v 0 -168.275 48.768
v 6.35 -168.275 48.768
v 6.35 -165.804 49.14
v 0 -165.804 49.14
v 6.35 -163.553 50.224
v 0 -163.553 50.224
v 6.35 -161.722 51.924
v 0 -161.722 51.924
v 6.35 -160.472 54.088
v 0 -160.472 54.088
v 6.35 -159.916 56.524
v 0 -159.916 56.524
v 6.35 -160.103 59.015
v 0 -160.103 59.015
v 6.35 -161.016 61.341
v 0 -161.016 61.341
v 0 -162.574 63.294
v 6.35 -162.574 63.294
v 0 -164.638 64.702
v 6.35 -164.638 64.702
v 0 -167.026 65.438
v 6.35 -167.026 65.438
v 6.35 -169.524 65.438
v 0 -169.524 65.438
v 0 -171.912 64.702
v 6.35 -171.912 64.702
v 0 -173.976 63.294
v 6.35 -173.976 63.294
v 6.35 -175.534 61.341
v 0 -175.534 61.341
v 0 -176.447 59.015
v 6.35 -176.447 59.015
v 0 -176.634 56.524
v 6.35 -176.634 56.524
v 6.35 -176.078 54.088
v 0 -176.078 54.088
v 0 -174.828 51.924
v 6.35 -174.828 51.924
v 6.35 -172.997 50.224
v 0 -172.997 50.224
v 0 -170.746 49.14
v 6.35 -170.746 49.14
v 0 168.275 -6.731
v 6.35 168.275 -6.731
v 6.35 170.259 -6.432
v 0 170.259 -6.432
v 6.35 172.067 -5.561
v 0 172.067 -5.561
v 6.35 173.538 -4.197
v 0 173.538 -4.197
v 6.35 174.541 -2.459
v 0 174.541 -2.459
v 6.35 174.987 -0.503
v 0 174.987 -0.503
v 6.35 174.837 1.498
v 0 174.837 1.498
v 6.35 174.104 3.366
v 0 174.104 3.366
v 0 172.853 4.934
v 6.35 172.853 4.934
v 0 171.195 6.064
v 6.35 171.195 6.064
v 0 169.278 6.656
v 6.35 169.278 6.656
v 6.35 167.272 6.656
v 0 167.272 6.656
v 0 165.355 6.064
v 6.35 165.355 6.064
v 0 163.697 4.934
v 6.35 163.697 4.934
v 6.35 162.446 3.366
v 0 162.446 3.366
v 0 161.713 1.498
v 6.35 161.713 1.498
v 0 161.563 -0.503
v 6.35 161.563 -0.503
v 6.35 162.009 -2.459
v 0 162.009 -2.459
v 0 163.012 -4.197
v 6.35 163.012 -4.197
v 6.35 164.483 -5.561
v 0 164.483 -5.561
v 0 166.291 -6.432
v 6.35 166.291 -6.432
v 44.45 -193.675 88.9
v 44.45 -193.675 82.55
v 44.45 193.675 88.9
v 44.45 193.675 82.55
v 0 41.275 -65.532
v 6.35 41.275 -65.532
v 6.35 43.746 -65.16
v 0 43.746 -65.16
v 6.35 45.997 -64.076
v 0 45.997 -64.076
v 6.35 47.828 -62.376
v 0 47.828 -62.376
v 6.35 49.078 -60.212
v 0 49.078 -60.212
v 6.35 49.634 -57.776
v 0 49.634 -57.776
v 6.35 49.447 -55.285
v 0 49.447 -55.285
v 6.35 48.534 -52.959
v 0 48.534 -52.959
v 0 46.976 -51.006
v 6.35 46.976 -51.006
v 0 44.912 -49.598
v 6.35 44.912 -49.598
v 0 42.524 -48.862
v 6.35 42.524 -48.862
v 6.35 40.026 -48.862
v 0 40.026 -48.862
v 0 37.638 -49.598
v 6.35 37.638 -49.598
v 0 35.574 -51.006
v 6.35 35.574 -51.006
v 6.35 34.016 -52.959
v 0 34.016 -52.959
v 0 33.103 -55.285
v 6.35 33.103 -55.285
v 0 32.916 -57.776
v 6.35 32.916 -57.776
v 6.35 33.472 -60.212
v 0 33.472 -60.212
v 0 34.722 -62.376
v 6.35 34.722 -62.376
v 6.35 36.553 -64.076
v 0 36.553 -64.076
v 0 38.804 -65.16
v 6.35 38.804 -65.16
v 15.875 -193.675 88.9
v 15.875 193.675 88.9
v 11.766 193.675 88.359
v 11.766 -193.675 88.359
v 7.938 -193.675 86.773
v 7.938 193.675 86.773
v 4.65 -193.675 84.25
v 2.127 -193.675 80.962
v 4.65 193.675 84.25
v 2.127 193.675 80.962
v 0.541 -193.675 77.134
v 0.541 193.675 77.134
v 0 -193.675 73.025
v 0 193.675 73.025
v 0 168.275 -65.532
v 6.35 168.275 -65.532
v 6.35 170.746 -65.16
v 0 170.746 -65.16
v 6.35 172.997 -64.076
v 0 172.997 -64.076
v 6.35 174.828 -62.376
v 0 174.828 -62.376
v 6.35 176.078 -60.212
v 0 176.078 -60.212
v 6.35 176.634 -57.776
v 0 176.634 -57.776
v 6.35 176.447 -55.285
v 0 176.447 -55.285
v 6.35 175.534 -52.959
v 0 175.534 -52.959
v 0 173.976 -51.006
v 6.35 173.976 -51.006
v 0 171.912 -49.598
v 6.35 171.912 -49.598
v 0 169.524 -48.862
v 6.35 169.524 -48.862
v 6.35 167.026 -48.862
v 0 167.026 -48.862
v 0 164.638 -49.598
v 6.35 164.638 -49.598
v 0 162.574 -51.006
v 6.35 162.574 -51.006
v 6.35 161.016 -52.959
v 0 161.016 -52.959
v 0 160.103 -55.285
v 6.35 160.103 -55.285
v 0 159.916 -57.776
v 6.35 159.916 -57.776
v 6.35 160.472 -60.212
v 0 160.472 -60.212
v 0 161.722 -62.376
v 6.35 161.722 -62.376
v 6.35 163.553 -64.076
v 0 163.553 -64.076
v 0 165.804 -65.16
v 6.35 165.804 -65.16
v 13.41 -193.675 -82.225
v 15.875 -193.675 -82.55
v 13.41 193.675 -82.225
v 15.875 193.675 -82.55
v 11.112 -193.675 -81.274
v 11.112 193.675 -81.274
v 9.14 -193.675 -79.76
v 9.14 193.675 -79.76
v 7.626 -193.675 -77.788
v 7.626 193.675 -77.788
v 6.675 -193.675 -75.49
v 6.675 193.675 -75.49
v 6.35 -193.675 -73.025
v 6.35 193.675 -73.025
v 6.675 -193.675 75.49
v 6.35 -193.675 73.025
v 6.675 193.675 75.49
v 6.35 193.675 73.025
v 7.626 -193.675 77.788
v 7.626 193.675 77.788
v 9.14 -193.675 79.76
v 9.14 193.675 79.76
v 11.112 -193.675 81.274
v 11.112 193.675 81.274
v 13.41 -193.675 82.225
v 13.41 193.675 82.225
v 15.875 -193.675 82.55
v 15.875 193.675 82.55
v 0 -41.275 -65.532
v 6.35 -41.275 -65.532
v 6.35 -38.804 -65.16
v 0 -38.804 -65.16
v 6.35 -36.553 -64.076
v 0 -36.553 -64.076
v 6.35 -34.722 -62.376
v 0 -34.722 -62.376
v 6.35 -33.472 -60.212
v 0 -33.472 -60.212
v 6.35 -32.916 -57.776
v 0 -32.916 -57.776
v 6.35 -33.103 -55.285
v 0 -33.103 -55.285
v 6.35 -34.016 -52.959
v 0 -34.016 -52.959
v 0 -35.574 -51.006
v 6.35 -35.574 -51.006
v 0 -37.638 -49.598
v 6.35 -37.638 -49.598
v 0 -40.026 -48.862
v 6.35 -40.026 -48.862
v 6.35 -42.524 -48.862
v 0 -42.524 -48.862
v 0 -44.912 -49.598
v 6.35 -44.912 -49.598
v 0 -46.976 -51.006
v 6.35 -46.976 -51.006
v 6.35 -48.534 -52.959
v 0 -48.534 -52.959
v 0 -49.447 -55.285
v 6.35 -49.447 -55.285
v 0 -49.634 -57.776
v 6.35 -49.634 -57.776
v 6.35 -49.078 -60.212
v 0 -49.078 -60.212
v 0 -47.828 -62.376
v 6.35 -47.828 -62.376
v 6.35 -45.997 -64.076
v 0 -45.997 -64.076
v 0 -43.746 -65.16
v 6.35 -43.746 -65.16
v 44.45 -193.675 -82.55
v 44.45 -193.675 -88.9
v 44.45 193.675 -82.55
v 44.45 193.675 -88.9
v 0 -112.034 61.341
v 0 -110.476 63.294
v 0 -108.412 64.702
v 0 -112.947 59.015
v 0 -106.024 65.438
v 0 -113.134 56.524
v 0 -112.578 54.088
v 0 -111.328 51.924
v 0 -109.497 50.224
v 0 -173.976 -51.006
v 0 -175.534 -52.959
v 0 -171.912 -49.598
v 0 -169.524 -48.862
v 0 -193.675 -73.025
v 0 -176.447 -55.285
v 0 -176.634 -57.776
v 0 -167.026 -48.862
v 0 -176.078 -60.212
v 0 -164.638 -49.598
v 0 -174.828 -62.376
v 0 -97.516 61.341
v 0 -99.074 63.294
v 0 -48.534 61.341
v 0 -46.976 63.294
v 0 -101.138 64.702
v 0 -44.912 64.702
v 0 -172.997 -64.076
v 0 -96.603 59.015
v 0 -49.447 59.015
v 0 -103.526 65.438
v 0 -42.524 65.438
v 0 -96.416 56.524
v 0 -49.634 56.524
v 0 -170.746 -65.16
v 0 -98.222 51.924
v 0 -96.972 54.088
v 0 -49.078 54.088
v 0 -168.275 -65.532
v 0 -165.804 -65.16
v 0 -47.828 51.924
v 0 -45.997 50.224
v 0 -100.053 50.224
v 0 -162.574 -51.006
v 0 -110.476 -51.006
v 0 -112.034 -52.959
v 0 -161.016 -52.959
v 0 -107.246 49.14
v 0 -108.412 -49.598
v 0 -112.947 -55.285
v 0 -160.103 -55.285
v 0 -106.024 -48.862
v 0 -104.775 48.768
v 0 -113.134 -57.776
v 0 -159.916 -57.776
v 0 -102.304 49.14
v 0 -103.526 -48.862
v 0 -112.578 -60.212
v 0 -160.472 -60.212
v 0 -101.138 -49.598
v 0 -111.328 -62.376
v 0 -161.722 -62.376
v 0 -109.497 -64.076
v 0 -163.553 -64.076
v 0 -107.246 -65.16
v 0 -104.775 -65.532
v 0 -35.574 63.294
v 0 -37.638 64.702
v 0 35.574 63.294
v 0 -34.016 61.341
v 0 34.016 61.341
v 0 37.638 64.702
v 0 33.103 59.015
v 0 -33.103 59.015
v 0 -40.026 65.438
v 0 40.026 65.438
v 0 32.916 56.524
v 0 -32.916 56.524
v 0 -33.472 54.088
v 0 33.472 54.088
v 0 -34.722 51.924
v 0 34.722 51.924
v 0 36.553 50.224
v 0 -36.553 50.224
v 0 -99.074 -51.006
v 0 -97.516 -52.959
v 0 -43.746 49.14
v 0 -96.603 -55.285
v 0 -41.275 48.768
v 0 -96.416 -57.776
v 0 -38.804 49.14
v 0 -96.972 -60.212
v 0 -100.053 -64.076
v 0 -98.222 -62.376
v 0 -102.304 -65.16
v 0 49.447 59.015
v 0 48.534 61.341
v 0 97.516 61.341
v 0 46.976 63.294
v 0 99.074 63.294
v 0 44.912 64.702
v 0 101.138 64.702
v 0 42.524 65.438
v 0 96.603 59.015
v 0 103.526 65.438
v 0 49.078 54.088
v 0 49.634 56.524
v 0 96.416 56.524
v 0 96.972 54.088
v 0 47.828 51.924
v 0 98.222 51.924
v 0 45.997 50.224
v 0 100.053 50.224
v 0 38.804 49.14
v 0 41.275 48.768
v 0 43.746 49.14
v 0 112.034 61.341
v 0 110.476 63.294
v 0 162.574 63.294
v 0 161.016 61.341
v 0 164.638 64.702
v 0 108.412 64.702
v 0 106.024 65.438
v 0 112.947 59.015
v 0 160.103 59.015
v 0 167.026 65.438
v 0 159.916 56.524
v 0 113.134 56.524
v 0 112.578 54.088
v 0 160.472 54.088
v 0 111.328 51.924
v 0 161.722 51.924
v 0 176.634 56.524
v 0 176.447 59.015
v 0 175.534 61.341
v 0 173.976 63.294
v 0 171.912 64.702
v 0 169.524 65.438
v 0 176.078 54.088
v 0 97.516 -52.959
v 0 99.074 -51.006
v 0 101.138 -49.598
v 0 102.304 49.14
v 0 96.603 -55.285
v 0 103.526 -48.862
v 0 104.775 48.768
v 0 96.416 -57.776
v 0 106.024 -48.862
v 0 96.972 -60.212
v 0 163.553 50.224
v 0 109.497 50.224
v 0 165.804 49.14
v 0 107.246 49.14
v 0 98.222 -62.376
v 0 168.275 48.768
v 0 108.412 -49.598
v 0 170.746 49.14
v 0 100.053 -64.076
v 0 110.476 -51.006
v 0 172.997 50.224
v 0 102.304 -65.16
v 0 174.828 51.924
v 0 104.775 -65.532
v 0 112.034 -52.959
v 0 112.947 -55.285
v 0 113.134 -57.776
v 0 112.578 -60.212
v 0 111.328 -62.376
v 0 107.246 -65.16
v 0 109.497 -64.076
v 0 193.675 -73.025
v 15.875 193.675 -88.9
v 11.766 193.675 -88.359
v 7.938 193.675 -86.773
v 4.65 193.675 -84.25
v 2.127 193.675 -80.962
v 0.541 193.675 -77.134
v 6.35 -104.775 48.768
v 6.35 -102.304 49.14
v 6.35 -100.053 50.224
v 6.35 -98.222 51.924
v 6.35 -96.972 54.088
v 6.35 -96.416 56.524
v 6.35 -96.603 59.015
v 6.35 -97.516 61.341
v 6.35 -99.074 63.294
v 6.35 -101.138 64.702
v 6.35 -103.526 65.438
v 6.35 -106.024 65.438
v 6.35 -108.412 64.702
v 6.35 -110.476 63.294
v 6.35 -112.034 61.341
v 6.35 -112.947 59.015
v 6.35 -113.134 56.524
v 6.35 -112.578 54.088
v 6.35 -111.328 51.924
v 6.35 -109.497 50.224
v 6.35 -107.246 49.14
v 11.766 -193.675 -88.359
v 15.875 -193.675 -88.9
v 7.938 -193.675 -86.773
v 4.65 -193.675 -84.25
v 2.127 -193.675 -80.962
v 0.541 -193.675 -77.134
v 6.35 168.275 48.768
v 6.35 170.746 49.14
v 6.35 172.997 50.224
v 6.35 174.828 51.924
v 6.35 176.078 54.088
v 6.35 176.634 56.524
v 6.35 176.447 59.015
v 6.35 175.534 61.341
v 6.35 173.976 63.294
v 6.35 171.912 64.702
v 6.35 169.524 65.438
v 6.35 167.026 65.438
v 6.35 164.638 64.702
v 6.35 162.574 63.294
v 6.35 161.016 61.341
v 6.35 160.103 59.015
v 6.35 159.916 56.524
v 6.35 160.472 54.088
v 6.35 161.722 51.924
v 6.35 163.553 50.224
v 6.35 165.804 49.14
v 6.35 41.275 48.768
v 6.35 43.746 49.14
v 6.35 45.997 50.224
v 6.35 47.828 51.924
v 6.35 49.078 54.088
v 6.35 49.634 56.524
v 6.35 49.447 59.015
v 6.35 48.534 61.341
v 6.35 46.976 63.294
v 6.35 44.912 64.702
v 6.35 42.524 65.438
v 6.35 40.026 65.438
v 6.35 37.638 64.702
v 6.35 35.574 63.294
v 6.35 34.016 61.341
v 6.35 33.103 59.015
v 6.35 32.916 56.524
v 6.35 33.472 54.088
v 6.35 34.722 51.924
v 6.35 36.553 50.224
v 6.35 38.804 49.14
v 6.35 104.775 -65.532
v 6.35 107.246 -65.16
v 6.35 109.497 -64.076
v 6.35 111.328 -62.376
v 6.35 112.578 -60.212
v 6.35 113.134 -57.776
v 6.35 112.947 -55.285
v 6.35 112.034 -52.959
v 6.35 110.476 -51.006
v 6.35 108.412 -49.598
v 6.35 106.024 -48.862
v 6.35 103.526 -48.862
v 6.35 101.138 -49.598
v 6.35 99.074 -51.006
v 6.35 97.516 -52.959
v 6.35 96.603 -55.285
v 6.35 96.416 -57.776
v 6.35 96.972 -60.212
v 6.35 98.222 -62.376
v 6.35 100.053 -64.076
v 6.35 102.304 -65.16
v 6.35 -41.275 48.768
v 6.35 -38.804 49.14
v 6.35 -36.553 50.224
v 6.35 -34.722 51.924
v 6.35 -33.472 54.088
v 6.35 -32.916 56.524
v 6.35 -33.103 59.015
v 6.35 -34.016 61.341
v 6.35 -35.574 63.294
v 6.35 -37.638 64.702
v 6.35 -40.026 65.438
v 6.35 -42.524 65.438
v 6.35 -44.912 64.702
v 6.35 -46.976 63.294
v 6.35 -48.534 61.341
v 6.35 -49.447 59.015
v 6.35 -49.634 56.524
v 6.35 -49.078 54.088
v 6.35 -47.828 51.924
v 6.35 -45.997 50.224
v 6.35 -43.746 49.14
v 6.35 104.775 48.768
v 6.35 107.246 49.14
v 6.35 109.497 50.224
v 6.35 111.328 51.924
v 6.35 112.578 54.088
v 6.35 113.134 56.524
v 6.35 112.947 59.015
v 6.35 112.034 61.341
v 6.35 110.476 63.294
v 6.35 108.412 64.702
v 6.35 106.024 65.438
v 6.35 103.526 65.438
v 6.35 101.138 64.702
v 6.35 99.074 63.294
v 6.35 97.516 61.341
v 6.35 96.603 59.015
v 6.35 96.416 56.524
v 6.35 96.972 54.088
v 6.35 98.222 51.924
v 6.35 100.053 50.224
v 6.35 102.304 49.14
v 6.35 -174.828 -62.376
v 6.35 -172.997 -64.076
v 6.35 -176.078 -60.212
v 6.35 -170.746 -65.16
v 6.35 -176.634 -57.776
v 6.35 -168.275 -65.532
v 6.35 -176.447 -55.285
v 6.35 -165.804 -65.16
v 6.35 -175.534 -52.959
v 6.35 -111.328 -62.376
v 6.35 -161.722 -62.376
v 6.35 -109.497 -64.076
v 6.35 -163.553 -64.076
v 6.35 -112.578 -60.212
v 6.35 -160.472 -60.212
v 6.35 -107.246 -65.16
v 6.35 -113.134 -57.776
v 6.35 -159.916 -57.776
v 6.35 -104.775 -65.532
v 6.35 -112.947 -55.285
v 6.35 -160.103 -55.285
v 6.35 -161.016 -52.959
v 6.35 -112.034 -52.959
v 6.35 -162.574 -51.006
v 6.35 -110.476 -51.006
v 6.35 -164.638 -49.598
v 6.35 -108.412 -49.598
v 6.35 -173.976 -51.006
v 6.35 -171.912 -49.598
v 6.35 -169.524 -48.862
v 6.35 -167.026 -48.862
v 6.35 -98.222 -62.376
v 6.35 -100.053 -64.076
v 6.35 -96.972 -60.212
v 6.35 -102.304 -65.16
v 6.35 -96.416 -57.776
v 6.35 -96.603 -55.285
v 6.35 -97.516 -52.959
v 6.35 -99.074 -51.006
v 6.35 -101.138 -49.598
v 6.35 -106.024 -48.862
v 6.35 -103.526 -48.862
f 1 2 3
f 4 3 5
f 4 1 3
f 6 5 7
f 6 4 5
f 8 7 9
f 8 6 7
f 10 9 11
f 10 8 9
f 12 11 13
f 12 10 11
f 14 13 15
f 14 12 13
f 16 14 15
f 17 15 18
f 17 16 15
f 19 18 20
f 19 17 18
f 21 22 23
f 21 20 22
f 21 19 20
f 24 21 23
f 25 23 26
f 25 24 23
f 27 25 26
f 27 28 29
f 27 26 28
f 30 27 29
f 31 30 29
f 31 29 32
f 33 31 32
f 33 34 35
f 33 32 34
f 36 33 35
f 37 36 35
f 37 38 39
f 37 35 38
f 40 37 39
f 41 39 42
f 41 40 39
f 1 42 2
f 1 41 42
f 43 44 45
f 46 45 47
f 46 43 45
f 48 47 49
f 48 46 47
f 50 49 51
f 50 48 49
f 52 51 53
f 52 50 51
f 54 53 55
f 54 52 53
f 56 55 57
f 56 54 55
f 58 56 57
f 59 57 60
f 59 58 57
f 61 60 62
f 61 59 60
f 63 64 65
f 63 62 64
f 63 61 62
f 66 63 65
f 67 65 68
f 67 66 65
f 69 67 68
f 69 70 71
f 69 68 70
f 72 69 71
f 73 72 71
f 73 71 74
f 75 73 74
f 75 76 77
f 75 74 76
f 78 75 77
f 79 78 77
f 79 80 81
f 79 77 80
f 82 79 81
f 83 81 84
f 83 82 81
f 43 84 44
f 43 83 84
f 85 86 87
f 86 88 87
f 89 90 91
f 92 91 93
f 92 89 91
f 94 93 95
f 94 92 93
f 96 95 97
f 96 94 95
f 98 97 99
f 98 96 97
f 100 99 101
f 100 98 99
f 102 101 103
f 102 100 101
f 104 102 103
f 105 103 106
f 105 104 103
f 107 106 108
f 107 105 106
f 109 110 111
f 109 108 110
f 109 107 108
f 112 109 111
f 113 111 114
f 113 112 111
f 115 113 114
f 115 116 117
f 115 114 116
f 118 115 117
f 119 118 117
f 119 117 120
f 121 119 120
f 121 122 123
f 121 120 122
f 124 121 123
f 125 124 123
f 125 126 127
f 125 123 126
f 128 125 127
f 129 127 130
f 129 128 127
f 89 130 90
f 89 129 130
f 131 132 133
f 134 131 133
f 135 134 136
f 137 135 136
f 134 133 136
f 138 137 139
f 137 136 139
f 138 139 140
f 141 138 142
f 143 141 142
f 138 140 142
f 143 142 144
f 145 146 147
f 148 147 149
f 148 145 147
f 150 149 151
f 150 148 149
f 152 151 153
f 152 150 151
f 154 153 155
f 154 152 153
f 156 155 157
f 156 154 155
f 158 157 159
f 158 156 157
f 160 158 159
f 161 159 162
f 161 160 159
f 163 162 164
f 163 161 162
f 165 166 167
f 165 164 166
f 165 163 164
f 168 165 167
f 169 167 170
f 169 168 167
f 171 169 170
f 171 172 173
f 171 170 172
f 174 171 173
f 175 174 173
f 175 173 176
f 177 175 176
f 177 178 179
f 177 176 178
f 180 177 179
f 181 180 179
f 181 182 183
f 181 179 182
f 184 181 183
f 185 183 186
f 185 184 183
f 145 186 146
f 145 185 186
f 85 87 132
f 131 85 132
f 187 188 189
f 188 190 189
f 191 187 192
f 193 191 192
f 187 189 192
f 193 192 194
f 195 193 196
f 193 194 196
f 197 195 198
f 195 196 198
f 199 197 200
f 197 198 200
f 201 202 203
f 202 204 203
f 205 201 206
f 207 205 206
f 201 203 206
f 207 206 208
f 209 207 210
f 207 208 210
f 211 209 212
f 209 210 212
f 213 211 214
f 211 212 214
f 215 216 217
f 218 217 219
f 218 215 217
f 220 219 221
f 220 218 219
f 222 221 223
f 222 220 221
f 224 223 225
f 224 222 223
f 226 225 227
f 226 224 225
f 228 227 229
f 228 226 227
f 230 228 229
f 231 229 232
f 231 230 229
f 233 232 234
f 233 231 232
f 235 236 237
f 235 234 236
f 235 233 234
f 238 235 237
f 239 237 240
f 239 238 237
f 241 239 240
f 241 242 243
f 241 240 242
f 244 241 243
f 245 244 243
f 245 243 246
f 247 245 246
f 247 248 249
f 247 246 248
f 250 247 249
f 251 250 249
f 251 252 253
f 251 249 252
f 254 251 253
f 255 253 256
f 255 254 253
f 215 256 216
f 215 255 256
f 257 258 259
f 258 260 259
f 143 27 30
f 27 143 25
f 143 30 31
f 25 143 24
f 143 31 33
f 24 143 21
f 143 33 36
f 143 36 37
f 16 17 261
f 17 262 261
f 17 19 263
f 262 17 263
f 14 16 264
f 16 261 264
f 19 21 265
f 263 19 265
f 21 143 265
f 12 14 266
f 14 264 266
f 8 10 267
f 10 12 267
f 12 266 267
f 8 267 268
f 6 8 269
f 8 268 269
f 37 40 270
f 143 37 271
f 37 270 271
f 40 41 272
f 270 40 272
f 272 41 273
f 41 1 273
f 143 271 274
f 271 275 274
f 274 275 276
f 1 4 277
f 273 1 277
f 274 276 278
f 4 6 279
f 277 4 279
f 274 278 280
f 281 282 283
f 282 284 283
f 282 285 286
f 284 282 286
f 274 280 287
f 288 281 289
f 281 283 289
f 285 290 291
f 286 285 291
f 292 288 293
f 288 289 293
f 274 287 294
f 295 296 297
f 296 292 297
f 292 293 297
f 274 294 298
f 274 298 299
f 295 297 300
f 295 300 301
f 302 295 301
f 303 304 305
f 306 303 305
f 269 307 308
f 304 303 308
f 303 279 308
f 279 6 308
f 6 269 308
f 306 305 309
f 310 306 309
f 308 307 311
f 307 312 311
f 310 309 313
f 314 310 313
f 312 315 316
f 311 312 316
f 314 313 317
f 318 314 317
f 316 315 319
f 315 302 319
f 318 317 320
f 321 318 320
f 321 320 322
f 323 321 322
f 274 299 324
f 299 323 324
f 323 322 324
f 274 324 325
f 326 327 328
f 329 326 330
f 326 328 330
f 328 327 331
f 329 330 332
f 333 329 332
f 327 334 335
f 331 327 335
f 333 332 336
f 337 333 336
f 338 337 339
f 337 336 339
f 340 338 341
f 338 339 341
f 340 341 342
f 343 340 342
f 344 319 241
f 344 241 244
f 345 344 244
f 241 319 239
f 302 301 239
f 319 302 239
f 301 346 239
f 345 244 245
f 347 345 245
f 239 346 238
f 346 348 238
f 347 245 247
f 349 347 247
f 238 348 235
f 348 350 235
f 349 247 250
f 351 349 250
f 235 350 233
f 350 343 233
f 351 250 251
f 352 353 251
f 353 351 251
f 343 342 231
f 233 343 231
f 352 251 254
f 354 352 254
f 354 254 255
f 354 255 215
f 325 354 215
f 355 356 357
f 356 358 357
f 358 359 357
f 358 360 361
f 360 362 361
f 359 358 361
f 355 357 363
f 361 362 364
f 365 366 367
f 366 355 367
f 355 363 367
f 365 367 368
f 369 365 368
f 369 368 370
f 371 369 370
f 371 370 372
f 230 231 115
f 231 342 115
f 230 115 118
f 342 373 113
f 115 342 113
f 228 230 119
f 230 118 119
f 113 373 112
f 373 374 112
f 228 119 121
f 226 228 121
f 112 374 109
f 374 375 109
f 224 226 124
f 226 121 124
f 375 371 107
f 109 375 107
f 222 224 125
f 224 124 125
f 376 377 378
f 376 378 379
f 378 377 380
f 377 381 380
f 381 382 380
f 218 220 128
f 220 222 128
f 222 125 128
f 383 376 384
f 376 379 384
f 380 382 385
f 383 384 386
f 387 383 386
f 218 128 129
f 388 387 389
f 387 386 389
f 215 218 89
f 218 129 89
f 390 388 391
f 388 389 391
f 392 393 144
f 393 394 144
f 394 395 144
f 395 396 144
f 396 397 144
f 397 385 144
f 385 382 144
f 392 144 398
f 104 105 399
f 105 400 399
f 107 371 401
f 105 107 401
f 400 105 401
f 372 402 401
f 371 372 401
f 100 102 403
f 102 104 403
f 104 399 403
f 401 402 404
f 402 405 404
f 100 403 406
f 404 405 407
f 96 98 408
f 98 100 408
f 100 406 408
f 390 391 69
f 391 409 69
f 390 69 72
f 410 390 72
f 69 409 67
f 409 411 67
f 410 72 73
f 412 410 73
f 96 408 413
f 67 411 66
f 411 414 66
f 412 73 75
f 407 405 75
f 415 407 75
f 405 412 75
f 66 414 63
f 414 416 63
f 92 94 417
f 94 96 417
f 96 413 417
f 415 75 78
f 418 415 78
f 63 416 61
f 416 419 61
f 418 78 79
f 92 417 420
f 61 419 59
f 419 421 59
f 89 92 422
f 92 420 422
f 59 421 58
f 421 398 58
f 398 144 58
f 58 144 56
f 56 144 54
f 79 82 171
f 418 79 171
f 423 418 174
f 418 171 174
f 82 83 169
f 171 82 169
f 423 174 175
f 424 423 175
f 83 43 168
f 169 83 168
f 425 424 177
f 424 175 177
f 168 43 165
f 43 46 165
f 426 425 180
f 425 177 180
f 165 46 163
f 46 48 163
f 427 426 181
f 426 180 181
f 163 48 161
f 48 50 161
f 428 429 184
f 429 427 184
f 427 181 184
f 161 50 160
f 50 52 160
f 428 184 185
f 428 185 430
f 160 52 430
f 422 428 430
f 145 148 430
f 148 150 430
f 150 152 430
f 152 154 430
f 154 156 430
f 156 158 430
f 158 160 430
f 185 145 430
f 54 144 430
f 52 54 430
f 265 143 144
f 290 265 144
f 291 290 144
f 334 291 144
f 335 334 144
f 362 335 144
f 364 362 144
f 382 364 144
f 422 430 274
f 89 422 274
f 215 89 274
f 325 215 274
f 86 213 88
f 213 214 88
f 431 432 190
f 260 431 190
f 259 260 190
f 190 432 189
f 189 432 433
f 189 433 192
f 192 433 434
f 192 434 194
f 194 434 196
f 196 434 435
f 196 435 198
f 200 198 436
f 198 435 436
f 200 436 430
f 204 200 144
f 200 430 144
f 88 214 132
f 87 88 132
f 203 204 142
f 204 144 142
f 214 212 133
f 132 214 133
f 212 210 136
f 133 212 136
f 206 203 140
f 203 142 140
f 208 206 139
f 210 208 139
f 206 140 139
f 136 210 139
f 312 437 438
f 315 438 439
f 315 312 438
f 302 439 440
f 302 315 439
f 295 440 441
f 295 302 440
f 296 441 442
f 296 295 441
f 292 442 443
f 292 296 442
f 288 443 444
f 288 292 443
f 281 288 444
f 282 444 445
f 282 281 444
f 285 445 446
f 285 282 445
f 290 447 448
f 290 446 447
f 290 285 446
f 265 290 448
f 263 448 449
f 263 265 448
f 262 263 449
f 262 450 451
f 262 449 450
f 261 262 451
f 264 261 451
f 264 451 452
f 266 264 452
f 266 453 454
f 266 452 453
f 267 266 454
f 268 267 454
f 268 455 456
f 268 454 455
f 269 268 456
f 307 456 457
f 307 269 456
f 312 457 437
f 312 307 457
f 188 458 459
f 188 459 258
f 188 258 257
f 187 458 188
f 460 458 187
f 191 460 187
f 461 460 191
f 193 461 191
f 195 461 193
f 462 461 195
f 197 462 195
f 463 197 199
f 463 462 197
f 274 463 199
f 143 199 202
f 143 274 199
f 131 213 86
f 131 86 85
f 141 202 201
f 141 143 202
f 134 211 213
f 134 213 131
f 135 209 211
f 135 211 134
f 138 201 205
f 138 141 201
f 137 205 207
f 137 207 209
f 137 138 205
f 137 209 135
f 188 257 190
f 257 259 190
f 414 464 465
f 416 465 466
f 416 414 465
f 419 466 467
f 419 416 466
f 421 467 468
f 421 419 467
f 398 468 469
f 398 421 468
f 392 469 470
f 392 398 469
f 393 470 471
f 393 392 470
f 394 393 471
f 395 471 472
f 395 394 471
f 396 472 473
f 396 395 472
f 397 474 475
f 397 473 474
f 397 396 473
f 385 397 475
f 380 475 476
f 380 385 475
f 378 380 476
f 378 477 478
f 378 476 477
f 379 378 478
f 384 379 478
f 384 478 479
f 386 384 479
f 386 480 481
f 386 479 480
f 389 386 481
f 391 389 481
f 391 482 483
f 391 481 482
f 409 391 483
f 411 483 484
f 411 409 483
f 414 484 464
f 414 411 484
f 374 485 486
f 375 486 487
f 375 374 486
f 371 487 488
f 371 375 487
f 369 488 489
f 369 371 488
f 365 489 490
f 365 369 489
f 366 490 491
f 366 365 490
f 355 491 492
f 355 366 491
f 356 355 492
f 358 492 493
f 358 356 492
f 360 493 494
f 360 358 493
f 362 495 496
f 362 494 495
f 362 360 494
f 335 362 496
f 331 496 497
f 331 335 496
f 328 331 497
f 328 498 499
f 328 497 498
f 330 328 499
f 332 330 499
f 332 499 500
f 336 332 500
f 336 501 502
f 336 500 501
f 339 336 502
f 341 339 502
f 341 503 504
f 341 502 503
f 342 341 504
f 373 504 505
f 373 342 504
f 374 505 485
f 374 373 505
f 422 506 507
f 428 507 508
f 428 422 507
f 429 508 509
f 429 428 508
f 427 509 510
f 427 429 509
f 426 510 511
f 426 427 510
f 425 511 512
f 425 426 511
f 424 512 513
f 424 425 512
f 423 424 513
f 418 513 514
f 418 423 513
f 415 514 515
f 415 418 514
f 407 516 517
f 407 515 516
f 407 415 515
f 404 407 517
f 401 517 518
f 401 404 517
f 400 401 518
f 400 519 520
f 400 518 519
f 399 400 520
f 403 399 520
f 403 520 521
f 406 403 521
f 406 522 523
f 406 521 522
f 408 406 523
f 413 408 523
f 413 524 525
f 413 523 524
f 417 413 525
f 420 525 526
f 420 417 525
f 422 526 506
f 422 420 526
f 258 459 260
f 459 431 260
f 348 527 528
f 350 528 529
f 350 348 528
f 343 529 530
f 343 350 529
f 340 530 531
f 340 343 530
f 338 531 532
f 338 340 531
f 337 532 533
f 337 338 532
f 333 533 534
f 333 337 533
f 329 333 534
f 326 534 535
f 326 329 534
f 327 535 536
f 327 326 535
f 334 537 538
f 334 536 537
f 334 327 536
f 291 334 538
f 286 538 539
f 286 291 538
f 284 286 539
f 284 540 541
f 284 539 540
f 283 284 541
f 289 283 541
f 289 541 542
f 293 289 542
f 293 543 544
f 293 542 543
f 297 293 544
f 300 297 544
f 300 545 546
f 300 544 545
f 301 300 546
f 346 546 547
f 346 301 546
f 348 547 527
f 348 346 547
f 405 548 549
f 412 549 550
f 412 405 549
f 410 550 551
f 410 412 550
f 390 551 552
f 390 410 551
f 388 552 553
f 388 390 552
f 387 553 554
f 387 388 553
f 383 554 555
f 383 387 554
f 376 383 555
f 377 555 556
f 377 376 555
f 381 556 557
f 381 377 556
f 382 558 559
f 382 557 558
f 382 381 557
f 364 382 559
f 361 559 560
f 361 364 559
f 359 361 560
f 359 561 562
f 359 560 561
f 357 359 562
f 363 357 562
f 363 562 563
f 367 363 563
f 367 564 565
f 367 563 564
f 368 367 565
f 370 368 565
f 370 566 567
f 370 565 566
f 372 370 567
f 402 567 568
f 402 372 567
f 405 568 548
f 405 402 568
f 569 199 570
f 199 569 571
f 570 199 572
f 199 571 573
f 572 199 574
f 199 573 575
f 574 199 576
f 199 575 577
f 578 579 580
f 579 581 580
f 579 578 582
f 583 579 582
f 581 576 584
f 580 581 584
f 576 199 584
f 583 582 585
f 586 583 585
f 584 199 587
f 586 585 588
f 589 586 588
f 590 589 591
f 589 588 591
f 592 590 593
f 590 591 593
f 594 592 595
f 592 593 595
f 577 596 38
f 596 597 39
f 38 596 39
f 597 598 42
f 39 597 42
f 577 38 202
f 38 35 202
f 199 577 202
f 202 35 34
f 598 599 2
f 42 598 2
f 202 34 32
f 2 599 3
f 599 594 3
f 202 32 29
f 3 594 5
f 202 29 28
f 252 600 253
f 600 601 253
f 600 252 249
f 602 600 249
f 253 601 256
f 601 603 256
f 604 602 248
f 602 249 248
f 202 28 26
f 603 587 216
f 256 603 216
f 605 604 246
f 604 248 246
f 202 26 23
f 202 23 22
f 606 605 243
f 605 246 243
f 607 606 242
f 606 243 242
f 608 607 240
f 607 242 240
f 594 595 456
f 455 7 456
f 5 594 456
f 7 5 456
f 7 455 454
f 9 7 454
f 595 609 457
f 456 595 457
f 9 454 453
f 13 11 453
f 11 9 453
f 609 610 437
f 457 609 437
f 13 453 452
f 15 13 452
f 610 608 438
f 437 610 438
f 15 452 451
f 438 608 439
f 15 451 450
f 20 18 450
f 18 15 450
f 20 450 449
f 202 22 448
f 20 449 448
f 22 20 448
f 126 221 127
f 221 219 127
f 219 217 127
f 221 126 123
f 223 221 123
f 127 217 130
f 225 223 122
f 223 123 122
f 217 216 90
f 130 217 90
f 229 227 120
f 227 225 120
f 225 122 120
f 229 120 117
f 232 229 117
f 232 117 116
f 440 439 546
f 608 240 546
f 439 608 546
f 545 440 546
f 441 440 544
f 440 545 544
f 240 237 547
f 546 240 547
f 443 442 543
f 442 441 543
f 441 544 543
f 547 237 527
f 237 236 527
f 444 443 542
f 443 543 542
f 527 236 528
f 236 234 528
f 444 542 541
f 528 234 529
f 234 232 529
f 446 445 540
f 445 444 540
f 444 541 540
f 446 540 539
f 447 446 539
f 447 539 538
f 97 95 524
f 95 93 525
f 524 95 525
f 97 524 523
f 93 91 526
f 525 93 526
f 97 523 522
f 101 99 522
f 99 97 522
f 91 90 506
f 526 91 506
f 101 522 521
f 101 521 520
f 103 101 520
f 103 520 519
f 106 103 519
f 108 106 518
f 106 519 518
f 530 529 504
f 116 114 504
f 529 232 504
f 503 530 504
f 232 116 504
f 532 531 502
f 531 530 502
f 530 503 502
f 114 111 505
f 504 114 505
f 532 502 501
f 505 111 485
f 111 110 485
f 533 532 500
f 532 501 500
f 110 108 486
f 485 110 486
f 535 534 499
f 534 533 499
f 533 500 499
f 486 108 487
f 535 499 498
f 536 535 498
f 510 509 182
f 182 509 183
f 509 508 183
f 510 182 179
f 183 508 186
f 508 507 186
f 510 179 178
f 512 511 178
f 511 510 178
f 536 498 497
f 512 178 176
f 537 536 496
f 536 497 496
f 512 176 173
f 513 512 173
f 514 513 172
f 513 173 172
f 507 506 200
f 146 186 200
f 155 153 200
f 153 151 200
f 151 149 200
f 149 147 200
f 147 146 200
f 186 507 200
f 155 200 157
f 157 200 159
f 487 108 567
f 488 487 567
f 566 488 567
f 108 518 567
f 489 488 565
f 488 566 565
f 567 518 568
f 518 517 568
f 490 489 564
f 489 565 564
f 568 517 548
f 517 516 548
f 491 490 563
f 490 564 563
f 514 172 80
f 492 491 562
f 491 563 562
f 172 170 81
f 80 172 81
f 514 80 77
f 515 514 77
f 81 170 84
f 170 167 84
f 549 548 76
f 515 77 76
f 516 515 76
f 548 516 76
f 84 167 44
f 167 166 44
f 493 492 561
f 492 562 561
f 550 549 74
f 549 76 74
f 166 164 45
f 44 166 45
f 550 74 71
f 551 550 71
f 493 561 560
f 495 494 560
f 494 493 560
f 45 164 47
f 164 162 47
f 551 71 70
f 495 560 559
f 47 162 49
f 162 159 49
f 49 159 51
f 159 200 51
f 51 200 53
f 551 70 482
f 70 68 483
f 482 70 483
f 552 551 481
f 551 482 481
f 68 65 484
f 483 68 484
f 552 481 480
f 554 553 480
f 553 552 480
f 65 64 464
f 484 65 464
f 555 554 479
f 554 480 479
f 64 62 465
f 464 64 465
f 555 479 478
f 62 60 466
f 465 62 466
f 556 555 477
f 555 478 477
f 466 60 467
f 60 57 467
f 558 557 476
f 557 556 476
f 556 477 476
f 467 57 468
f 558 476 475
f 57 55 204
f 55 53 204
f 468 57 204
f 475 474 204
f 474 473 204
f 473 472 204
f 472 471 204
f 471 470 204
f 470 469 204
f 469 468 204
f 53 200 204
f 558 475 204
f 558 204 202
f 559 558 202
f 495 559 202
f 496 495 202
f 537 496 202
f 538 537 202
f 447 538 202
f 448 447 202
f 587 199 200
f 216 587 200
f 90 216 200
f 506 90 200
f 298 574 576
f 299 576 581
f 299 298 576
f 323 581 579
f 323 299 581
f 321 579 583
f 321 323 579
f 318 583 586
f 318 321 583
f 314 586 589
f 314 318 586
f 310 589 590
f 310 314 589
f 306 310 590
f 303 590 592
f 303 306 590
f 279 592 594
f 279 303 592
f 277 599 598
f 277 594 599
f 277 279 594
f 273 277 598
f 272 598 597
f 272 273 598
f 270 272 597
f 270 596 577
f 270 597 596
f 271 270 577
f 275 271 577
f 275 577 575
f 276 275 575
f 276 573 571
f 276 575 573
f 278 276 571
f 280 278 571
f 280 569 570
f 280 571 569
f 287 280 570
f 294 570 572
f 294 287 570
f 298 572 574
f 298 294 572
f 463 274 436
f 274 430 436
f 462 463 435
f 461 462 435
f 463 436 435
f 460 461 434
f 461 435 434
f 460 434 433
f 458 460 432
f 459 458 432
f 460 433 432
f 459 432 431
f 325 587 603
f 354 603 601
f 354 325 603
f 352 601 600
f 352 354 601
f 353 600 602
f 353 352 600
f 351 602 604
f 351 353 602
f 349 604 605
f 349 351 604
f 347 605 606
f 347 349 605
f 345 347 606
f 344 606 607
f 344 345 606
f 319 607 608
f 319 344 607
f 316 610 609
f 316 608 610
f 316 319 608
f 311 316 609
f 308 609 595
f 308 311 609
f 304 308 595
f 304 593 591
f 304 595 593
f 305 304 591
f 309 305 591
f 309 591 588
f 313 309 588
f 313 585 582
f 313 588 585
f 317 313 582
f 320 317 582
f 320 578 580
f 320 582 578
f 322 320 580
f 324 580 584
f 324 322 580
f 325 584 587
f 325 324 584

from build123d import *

# Parameters (mm, degrees)
BASE_EXTRUDE_DEPTH      = 193.675
BASE_EXTRUDE_DEPTH_BACK = 193.675
SKETCH2_R               = 8.382
SKETCH2_R_2             = 6.731
HOLES_DEPTH             = 218.690188399


with BuildPart() as part:
    # Sketch1 → Base-Extrude (new, two sides: drawn at the far end of the back side and taken through both)
    with BuildSketch(Plane(origin=(0, 0, 0), x_dir=(0, 0, -1), z_dir=(0, 1, 0)).offset(-BASE_EXTRUDE_DEPTH_BACK)):
        with BuildLine():
            Line((-73.025, 0), (73.025, 0))
            ThreePointArc((73.025, 0), (84.250320151, -4.649679849), (88.9, -15.875))
            Line((88.9, -15.875), (88.9, -44.45))
            Line((88.9, -44.45), (82.55, -44.45))
            Line((82.55, -44.45), (82.55, -15.875))
            ThreePointArc((82.55, -15.875), (79.760192091, -9.139807909), (73.025, -6.35))
            Line((73.025, -6.35), (-73.025, -6.35))
            ThreePointArc((-73.025, -6.35), (-79.760192091, -9.139807909), (-82.55, -15.875))
            Line((-82.55, -15.875), (-82.55, -44.45))
            Line((-82.55, -44.45), (-88.9, -44.45))
            Line((-88.9, -44.45), (-88.9, -15.875))
            ThreePointArc((-88.9, -15.875), (-84.250320151, -4.649679849), (-73.025, 0))
        make_face()
    extrude(amount=BASE_EXTRUDE_DEPTH + BASE_EXTRUDE_DEPTH_BACK)

    # Sketch2 → Holes (cut, through all)
    with BuildSketch(Plane(origin=(0, 0, 0), x_dir=(0, 0, -1), z_dir=(1, 0, 0))):
        with Locations((57.15, 41.275)):
            Circle(SKETCH2_R)
        with Locations((57.15, 104.775)):
            Circle(SKETCH2_R)
        with Locations((57.15, 168.275)):
            Circle(SKETCH2_R)
        with Locations((57.15, -41.275)):
            Circle(SKETCH2_R)
        with Locations((57.15, -104.775)):
            Circle(SKETCH2_R)
        with Locations((57.15, -168.275)):
            Circle(SKETCH2_R)
        with Locations((-57.15, -168.275)):
            Circle(SKETCH2_R)
        with Locations((-57.15, -104.775)):
            Circle(SKETCH2_R)
        with Locations((-57.15, -41.275)):
            Circle(SKETCH2_R)
        with Locations((-57.15, 41.275)):
            Circle(SKETCH2_R)
        with Locations((-57.15, 104.775)):
            Circle(SKETCH2_R)
        with Locations((-57.15, 168.275)):
            Circle(SKETCH2_R)
        with Locations((0, 168.275)):
            Circle(SKETCH2_R_2)
    extrude(amount=HOLES_DEPTH, mode=Mode.SUBTRACT)


solid = part.part
